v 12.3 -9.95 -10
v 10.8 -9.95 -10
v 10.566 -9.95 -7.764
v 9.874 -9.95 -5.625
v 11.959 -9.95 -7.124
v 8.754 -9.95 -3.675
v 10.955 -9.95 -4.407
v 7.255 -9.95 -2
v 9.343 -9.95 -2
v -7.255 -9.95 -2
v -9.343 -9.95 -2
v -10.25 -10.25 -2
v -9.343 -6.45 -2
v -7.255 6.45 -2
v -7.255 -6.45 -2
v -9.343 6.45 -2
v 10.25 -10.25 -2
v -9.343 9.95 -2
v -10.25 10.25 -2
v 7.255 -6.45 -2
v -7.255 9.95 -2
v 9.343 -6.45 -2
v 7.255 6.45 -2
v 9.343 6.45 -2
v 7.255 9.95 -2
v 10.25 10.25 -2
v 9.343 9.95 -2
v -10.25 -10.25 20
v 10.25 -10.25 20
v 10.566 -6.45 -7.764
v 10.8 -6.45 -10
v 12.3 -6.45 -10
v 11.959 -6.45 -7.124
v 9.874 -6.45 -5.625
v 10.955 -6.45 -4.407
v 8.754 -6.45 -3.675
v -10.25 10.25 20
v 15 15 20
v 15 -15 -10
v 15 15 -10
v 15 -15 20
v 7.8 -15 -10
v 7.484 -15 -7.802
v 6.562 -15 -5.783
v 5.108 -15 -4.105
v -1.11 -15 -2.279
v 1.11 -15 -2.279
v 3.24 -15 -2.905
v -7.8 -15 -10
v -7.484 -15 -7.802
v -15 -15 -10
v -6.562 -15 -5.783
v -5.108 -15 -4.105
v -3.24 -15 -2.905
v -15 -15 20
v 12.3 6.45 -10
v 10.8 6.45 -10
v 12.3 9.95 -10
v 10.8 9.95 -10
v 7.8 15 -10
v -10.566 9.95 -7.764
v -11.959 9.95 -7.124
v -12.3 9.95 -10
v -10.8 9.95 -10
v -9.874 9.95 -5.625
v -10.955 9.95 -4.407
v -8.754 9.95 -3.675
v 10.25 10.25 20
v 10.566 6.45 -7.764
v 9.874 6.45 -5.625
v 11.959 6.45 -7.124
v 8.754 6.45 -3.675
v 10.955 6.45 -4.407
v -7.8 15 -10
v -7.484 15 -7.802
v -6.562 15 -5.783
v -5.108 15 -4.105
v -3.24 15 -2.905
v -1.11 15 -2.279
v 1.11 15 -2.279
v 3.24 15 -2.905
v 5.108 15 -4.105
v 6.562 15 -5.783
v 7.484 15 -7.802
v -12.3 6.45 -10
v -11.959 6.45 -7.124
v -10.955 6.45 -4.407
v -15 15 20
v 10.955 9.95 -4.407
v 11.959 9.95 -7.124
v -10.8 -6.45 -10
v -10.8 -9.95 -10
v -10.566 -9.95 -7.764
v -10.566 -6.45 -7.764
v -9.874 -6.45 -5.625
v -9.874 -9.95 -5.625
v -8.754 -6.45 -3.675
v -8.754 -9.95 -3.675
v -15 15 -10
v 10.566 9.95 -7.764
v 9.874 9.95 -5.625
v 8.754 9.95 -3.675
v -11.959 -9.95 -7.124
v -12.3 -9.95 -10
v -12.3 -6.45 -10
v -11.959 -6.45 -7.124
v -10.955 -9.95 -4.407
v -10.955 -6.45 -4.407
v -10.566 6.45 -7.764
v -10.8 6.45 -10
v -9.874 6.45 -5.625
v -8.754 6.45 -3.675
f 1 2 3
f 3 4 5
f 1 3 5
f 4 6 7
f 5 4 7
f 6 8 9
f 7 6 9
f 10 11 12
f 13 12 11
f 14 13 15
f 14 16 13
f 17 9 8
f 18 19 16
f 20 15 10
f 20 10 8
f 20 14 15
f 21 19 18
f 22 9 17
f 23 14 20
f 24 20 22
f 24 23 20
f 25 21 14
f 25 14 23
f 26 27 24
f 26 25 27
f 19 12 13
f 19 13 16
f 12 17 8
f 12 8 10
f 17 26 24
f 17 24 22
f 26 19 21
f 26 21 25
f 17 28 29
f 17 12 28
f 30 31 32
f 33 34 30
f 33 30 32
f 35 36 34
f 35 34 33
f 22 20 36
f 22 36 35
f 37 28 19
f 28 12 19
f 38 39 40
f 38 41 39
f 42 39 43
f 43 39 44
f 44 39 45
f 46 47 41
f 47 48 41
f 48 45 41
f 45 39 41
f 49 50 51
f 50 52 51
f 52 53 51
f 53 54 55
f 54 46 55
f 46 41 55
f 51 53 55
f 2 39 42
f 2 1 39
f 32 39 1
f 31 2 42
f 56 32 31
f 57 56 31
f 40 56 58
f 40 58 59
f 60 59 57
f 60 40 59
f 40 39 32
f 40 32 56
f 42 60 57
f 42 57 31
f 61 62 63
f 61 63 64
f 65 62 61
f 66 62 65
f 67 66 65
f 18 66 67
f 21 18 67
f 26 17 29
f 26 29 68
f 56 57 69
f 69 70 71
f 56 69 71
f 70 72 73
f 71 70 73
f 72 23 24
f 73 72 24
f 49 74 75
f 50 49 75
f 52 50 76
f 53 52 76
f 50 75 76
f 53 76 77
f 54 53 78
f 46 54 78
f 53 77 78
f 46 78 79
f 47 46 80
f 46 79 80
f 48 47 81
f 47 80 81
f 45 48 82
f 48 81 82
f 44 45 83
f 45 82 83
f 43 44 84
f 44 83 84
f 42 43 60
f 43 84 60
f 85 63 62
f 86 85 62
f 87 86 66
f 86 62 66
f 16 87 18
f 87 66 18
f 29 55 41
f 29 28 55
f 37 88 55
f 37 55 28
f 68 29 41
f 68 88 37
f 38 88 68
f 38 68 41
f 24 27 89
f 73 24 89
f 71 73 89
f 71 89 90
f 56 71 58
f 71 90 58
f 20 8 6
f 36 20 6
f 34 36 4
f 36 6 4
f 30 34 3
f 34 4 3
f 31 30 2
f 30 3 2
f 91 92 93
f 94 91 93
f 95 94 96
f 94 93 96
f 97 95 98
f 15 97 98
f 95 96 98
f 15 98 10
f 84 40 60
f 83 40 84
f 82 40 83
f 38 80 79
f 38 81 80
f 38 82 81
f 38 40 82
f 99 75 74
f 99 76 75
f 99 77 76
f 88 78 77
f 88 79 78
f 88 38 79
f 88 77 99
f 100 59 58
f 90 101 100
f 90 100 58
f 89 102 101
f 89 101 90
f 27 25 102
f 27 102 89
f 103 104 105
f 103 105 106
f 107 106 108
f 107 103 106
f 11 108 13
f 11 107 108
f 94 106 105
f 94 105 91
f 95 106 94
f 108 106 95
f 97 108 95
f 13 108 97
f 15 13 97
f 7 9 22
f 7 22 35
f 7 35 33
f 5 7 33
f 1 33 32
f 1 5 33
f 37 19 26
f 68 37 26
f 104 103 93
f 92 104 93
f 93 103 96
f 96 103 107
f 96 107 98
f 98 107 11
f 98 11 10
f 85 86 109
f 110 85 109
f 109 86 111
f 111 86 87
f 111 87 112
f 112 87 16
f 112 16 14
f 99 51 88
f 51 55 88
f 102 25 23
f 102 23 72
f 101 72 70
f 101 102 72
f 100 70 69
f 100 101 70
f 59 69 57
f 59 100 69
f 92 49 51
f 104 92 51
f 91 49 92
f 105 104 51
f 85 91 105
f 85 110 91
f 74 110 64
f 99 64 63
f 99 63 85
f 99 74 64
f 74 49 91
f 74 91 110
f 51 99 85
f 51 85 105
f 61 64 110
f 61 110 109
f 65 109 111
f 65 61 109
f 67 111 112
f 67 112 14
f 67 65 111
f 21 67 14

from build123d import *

# Parameters (mm, degrees)
SKETCH1_W           = 30
SKETCH1_H           = 30
SKETCH1_W_2         = 20.5
SKETCH1_H_2         = 20.5
BOSS_EXTRUDE1_DEPTH = 20
SKETCH2_W           = 30
SKETCH2_H           = 30
BOSS_EXTRUDE3_DEPTH = 10
SKETCH4_W           = 1.5
SKETCH4_H           = 3.5
CUT_REVOLVE1_ANGLE  = 180
SKETCH5_W           = 14.323407416
SKETCH5_H           = 3.5
CUT_EXTRUDE2_DEPTH  = 1.5
SKETCH6_W           = 20.5
SKETCH6_H           = 20.5
CUT_EXTRUDE3_DEPTH  = 2


with BuildPart() as part:
    # Sketch1 → Boss-Extrude1 (new body)
    with BuildSketch(Plane.XY):
        Rectangle(SKETCH1_W, SKETCH1_H)
        Rectangle(SKETCH1_W_2, SKETCH1_H_2, mode=Mode.SUBTRACT)
    extrude(amount=BOSS_EXTRUDE1_DEPTH)

    # Sketch2 → Boss-Extrude3 (add)
    with BuildSketch(Plane(origin=(0, 0, 0), x_dir=(-1, 0, 0), z_dir=(0, 0, -1))):
        Rectangle(SKETCH2_W, SKETCH2_H)
    extrude(amount=BOSS_EXTRUDE3_DEPTH)

    # Sketch4 → Cut-Revolve1 (revolve, cut)
    with BuildSketch(Plane(origin=(0, 0, -10), x_dir=(-1, 0, 0), z_dir=(0, 0, -1))):
        Polygon((0, 0), (0, 15), (7.8, 15), (7.8, 8.75), (7.8, 7.65), (7.8, 0), align=None)
        with Locations((11.55, 8.2)):
            Rectangle(SKETCH4_W, SKETCH4_H)
    cut_revolve1 = revolve(axis=Axis((0, 0, -10), (0, 1, 0)), revolution_arc=CUT_REVOLVE1_ANGLE, mode=Mode.SUBTRACT)

    # Sketch5 → Cut-Extrude2 (cut)
    with BuildSketch(Plane.XY):
        with Locations((0, 8.2)):
            Rectangle(SKETCH5_W, SKETCH5_H)
    cut_extrude2 = extrude(amount=-CUT_EXTRUDE2_DEPTH, mode=Mode.SUBTRACT)

    # Mirror1: Cut-Revolve1, Cut-Extrude2 across plane
    add(cut_revolve1.mirror(Plane(origin=(0, 0, -10), x_dir=(0, 0, 1), z_dir=(0, -1, 0))), mode=Mode.SUBTRACT)
    add(cut_extrude2.mirror(Plane(origin=(0, 0, -10), x_dir=(0, 0, 1), z_dir=(0, -1, 0))), mode=Mode.SUBTRACT)

    # Sketch6 → Cut-Extrude3 (cut)
    with BuildSketch(Plane.XY):
        Rectangle(SKETCH6_W, SKETCH6_H)
    extrude(amount=-CUT_EXTRUDE3_DEPTH, mode=Mode.SUBTRACT)


solid = part.part
